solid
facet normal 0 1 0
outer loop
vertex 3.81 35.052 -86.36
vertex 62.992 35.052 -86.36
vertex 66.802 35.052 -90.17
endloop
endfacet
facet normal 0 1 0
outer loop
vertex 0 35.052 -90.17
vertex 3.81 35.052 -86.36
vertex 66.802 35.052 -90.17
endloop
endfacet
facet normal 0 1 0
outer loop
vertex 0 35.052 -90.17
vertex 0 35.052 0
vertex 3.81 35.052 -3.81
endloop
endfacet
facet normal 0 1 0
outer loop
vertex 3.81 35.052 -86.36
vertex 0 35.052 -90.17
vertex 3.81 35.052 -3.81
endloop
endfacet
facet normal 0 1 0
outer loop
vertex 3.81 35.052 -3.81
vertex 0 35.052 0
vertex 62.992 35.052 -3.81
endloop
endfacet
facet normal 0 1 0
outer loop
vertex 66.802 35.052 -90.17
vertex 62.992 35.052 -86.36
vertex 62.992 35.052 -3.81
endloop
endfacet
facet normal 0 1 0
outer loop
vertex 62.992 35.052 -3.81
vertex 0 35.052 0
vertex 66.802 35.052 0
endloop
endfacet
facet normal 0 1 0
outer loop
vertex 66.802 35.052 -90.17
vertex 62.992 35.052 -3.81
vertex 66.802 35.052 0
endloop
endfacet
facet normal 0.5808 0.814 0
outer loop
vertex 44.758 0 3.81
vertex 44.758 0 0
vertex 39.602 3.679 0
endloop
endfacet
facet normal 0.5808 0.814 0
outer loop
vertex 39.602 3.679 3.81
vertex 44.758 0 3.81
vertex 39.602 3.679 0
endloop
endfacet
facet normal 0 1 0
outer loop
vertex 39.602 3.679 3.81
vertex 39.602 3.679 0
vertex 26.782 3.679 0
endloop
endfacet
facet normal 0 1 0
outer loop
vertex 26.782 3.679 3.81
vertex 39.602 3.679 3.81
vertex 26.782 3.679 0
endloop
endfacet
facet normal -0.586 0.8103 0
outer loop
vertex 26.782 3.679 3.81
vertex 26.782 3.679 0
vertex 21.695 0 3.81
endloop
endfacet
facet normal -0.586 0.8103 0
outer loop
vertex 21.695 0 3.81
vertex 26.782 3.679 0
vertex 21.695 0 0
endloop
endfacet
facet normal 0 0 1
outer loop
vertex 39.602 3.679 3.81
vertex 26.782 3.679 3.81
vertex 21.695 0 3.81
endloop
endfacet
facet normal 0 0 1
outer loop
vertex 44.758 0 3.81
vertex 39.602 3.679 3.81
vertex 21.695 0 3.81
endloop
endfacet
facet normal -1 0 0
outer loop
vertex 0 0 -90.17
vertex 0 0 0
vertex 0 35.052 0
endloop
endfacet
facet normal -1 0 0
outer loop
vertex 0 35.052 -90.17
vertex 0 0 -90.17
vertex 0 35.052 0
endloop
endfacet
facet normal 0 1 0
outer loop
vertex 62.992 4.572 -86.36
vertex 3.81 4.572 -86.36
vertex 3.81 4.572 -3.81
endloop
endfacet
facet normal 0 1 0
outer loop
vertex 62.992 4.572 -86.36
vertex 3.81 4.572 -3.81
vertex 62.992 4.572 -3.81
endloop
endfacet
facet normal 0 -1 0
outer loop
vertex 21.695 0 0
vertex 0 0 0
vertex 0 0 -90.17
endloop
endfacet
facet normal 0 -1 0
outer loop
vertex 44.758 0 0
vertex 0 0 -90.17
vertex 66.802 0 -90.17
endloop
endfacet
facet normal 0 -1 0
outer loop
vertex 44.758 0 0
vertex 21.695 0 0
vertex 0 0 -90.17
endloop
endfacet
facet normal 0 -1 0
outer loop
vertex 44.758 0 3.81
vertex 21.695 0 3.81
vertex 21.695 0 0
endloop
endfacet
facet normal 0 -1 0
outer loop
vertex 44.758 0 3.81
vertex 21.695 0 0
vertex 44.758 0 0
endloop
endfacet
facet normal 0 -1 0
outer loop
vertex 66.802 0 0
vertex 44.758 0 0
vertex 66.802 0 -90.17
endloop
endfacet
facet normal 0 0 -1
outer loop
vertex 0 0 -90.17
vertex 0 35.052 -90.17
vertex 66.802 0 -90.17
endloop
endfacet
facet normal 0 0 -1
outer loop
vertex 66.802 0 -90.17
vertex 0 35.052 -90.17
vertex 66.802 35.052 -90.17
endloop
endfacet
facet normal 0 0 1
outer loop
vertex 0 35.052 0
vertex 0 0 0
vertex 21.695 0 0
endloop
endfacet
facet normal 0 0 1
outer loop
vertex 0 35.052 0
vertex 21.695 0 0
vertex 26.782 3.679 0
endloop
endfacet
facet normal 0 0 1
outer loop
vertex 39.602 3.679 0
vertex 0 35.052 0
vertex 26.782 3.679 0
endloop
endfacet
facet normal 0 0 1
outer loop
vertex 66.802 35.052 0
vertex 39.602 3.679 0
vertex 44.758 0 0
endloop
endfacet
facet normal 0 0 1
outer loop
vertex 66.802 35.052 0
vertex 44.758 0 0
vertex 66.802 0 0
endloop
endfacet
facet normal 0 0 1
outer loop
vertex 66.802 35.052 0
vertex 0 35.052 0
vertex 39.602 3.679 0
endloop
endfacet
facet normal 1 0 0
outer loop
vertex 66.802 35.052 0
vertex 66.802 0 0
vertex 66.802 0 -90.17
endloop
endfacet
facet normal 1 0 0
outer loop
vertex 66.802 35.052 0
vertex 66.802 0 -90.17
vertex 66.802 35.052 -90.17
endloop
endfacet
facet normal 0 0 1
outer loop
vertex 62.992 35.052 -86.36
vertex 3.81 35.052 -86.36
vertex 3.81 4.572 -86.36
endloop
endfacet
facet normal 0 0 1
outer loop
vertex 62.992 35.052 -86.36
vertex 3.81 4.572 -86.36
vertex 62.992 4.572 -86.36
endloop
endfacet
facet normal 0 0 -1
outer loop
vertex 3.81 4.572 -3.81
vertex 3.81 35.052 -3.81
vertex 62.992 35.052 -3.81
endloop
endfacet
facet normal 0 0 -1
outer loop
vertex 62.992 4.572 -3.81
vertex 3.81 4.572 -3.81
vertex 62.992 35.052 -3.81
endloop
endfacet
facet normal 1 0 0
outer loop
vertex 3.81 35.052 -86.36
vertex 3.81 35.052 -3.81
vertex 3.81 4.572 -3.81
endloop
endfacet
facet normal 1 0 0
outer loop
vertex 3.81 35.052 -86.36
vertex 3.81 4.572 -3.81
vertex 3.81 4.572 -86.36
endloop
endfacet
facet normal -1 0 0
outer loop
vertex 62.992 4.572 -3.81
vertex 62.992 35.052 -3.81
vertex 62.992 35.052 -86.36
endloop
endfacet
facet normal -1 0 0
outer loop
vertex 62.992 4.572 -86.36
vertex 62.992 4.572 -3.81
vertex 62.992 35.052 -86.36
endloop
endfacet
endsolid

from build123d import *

# Parameters (mm, degrees)
SKETCH1_W           = 66.802
SKETCH1_H           = 35.052
BOSS_EXTRUDE1_DEPTH = 90.17
SKETCH2_W           = 59.182
SKETCH2_H           = 82.55
CUT_EXTRUDE2_DEPTH  = 30.48
BOSS_EXTRUDE2_DEPTH = 3.81


with BuildPart() as part:
    # Sketch1 → Boss-Extrude1 (new body)
    with BuildSketch(Plane.XY):
        with Locations((33.401, 17.526)):
            Rectangle(SKETCH1_W, SKETCH1_H)
    extrude(amount=-BOSS_EXTRUDE1_DEPTH)

    # Sketch2 → Cut-Extrude2 (cut)
    with BuildSketch(Plane(origin=(0, 35.052, 0), x_dir=(1, 0, 0), z_dir=(0, 1, 0))):
        with Locations((33.401, 45.085)):
            Rectangle(SKETCH2_W, SKETCH2_H)
    extrude(amount=-CUT_EXTRUDE2_DEPTH, mode=Mode.SUBTRACT)

    # Sketch3 → Boss-Extrude2 (add)
    with BuildSketch(Plane.XY):
        Polygon((26.781803903, 3.679405909), (21.695474271, 0), (33.226810629, 0), (44.758146987, 0), (39.602141606, 3.679405909), align=None)
    extrude(amount=BOSS_EXTRUDE2_DEPTH)


solid = part.part
